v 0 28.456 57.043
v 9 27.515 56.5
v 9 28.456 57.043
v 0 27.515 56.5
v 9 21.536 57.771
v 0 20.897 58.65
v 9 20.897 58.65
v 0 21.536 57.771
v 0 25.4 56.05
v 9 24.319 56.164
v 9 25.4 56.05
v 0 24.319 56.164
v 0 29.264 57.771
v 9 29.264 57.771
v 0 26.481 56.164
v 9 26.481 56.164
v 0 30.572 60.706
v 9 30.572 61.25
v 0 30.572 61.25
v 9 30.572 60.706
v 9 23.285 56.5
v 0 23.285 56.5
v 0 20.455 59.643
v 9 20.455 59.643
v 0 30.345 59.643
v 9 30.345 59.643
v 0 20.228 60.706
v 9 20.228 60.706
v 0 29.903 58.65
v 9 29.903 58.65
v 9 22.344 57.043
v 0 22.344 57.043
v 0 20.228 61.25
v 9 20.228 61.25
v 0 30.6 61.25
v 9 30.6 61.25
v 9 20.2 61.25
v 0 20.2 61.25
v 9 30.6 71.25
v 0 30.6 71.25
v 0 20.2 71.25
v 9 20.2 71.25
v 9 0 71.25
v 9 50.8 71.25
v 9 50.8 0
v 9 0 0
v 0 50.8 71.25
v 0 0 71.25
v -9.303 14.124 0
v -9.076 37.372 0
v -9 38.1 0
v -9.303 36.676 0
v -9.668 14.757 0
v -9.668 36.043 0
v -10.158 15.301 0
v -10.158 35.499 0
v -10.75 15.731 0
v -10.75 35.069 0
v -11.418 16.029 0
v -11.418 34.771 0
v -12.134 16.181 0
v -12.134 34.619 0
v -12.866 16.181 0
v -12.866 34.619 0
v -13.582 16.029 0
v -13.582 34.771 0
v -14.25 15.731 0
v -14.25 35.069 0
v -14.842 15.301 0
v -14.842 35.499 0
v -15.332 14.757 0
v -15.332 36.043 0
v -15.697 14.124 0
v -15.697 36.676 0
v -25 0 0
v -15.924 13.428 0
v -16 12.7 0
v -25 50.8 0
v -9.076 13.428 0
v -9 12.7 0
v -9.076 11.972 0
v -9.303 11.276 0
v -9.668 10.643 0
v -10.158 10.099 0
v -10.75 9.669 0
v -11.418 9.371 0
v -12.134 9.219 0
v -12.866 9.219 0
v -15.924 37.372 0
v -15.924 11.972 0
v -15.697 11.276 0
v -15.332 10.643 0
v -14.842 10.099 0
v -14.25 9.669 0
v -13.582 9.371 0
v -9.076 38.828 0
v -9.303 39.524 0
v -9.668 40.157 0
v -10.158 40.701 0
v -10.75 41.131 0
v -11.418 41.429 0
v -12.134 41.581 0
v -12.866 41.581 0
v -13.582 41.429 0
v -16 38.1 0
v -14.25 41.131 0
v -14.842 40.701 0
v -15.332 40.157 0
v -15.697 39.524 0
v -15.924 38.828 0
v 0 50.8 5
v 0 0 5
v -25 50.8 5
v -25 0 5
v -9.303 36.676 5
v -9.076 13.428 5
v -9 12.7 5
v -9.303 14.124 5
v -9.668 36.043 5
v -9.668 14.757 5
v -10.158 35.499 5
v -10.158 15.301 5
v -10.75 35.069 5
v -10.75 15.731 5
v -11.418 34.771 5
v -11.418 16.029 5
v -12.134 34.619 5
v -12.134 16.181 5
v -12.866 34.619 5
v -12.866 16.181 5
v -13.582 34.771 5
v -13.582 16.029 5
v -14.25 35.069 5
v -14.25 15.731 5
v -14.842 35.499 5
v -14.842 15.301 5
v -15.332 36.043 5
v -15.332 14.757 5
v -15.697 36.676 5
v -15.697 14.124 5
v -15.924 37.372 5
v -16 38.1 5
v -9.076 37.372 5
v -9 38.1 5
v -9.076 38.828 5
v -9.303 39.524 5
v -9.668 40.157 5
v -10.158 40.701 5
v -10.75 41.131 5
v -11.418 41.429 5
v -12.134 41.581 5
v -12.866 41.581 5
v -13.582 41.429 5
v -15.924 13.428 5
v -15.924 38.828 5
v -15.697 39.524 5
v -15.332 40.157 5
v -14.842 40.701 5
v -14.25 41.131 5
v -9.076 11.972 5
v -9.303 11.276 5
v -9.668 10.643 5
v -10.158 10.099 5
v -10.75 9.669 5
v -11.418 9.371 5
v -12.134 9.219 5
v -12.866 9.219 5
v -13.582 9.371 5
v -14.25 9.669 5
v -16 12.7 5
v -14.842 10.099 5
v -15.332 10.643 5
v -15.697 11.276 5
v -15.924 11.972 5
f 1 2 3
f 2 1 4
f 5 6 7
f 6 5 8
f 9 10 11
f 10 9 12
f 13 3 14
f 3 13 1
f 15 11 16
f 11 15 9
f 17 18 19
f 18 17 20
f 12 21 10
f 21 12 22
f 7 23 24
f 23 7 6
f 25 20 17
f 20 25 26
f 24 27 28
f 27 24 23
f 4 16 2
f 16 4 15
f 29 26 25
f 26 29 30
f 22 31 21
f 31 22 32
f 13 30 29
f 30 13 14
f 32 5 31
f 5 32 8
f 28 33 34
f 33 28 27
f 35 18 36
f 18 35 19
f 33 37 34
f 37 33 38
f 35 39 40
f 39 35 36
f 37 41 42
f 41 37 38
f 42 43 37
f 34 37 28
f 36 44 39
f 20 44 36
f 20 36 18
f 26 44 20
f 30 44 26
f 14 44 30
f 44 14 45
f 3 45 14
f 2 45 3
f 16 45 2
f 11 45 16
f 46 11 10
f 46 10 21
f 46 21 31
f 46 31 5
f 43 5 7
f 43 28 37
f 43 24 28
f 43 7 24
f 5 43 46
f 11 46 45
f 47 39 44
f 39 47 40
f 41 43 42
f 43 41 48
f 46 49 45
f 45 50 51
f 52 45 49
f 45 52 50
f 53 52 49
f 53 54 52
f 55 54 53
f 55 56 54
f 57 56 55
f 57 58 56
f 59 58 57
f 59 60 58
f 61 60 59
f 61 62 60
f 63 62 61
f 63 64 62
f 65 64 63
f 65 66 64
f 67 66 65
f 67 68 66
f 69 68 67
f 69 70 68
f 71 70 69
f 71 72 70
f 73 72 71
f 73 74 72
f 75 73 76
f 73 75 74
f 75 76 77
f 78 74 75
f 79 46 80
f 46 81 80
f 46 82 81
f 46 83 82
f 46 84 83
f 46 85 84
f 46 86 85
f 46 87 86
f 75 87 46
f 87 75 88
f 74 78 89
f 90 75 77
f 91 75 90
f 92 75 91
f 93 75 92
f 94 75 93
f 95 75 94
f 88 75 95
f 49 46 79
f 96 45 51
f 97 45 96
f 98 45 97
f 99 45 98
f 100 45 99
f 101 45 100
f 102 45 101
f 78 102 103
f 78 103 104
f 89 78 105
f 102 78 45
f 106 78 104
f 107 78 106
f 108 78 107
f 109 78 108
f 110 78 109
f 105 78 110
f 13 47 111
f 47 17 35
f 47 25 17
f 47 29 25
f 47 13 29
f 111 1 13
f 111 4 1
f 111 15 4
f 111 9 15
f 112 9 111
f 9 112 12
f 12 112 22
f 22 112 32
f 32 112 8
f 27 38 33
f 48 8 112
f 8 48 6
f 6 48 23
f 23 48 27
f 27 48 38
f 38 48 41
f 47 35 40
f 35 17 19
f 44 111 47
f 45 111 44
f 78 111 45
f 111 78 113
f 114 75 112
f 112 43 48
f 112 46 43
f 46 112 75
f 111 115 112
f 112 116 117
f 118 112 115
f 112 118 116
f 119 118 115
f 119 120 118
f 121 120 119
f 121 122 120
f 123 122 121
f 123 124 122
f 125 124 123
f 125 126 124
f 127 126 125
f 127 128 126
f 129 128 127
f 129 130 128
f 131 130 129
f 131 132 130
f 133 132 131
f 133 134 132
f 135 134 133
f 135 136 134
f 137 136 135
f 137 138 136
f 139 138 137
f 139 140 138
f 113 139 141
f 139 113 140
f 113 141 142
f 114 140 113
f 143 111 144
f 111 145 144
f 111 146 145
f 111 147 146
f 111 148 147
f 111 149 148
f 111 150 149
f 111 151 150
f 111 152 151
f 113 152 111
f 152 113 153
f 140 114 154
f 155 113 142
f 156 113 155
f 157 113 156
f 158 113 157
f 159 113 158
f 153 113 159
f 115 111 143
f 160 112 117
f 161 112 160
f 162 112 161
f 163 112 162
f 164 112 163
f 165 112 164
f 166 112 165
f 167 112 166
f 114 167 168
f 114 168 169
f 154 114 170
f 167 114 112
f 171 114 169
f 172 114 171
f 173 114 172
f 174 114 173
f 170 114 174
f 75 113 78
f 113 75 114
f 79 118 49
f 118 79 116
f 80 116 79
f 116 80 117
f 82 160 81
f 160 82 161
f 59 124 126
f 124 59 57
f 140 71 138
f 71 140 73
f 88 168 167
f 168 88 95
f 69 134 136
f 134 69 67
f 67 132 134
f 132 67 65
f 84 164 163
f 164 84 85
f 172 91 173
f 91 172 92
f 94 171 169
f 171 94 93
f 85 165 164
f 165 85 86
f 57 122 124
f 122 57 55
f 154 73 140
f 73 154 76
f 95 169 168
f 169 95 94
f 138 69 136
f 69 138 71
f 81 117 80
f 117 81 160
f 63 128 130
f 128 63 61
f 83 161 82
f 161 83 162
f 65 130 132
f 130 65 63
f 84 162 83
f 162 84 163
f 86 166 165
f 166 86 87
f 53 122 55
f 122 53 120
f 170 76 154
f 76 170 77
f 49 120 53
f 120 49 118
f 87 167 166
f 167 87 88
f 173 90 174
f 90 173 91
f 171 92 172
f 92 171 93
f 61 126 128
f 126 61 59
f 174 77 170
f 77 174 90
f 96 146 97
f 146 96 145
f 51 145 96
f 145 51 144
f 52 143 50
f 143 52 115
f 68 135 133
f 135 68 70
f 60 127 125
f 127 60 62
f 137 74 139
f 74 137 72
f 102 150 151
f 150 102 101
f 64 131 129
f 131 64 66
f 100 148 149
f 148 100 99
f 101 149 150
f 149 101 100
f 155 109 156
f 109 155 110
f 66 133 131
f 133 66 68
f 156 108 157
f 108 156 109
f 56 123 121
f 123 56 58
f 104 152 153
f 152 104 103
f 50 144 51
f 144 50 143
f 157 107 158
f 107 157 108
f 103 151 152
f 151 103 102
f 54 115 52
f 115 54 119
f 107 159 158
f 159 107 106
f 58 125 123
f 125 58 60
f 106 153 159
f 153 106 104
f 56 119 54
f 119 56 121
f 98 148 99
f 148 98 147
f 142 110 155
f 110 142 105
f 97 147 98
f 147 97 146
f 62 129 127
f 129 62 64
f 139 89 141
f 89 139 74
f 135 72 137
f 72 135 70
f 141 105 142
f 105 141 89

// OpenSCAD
// file: syringePumpConstants.scad
/* === Project-universal Constants === */

//Not all of these variables are used in this specific model,
//but the same variable set is used across all models in this project.

$fs = 0.1;

inch = 25.4; //for mm conversion

//width of base
baseSizeY = 2*inch;
centerY = baseSizeY / 2; //both axes go right down the middle of the base

//stepper motor
stepperZSize = 42;
stepperYSize = 42;

//608 bearing 
bearing608Height = 8.5;
bearing608Diameter = 22.5;

//height of holder for 80/20 screws
mountPlateHeight = 5;

//axis heights
threadedAxisHeight = stepperZSize/2 + mountPlateHeight + 4;
smoothAxisHeight = (threadedAxisHeight-6.6) / 2;
smoothRodRadius = 4.1; //original value: 4.2, previously changed to 4.05

//syringe properties
barrelDiameter = 32;

//barrelSlotThickness = 3;
//barrelSlotHeight = 28;

syringeCenterHeight = threadedAxisHeight + bearing608Diameter/2 + 4 + barrelDiameter/2;

//Megan
plungerDiameter = 34; //previously 26.5, prev 35
plungerThickness = 2.7; //previously 3
plungerInnerDiameter = 19;//previously 15
plungerClipThickness = 3.5; //previously 3

//slot parameters
barrelSlotThickness = 2.5; //2.5, 1.7
barrelSlotHeight = 35;




//fixes render oddities
floatCorrection = 0.001; 
floatCorrection2 = 2*floatCorrection; 

//8020 mounting plate
screwPlateSize = 25;	
screwRadius = 3.5;
// main file
include <syringePumpConstants.scad>

/* === Model-specific Constants === */

//cube containing rods and syringe barrel stop
mountXSize = 9;
mountZSize = syringeCenterHeight + 10; // 8/29 prev = syringeCenterHeight


/* === Model === */

//main cube, holds the two axes
difference(){
	cube(size=[mountXSize,baseSizeY,mountZSize]); 
	
	
	//bore hole for threaded rod
	//translate([-floatCorrection,centerY,threadedAxisHeight]){
	//	rotate(a=[0,90,0]){
	//		cylinder(h=mountXSize+floatCorrection2, r=smoothRodRadius-0.05);
	//	}
	//}

	//hole for smooth rod (needs to fit fairly tight)
	//translate([-floatCorrection,centerY,smoothAxisHeight]){
	//	rotate(a=[0,90,0]){
	//		cylinder(h=mountXSize+floatCorrection2, r=smoothRodRadius);
	//	}
	//}
	
	//hole for syringe barrel stopper
	translate([-floatCorrection,centerY,syringeCenterHeight]){
		rotate(a=[0,90,0]){
			cylinder(h=mountXSize+floatCorrection2, r=5.2);
		}
        // 8/29 translate and cube added
        translate([0,-5.2,0]){
			cube(size=[mountXSize+floatCorrection2,5.2*2,mountZSize]);
        }
	}
}

difference(){
	translate([-screwPlateSize,0,0]){
		cube(size=[screwPlateSize,baseSizeY,mountPlateHeight]);
	}

	translate([-screwPlateSize/2,baseSizeY/4,0]){
		cylinder(h=mountPlateHeight, r=screwRadius);
	}
	translate([-screwPlateSize/2,3*baseSizeY/4,0]){
		cylinder(h=mountPlateHeight, r=screwRadius);
	}

}

module bearing608(){
	cylinder(h=bearing608Height, r=bearing608Diameter/2);	
}
